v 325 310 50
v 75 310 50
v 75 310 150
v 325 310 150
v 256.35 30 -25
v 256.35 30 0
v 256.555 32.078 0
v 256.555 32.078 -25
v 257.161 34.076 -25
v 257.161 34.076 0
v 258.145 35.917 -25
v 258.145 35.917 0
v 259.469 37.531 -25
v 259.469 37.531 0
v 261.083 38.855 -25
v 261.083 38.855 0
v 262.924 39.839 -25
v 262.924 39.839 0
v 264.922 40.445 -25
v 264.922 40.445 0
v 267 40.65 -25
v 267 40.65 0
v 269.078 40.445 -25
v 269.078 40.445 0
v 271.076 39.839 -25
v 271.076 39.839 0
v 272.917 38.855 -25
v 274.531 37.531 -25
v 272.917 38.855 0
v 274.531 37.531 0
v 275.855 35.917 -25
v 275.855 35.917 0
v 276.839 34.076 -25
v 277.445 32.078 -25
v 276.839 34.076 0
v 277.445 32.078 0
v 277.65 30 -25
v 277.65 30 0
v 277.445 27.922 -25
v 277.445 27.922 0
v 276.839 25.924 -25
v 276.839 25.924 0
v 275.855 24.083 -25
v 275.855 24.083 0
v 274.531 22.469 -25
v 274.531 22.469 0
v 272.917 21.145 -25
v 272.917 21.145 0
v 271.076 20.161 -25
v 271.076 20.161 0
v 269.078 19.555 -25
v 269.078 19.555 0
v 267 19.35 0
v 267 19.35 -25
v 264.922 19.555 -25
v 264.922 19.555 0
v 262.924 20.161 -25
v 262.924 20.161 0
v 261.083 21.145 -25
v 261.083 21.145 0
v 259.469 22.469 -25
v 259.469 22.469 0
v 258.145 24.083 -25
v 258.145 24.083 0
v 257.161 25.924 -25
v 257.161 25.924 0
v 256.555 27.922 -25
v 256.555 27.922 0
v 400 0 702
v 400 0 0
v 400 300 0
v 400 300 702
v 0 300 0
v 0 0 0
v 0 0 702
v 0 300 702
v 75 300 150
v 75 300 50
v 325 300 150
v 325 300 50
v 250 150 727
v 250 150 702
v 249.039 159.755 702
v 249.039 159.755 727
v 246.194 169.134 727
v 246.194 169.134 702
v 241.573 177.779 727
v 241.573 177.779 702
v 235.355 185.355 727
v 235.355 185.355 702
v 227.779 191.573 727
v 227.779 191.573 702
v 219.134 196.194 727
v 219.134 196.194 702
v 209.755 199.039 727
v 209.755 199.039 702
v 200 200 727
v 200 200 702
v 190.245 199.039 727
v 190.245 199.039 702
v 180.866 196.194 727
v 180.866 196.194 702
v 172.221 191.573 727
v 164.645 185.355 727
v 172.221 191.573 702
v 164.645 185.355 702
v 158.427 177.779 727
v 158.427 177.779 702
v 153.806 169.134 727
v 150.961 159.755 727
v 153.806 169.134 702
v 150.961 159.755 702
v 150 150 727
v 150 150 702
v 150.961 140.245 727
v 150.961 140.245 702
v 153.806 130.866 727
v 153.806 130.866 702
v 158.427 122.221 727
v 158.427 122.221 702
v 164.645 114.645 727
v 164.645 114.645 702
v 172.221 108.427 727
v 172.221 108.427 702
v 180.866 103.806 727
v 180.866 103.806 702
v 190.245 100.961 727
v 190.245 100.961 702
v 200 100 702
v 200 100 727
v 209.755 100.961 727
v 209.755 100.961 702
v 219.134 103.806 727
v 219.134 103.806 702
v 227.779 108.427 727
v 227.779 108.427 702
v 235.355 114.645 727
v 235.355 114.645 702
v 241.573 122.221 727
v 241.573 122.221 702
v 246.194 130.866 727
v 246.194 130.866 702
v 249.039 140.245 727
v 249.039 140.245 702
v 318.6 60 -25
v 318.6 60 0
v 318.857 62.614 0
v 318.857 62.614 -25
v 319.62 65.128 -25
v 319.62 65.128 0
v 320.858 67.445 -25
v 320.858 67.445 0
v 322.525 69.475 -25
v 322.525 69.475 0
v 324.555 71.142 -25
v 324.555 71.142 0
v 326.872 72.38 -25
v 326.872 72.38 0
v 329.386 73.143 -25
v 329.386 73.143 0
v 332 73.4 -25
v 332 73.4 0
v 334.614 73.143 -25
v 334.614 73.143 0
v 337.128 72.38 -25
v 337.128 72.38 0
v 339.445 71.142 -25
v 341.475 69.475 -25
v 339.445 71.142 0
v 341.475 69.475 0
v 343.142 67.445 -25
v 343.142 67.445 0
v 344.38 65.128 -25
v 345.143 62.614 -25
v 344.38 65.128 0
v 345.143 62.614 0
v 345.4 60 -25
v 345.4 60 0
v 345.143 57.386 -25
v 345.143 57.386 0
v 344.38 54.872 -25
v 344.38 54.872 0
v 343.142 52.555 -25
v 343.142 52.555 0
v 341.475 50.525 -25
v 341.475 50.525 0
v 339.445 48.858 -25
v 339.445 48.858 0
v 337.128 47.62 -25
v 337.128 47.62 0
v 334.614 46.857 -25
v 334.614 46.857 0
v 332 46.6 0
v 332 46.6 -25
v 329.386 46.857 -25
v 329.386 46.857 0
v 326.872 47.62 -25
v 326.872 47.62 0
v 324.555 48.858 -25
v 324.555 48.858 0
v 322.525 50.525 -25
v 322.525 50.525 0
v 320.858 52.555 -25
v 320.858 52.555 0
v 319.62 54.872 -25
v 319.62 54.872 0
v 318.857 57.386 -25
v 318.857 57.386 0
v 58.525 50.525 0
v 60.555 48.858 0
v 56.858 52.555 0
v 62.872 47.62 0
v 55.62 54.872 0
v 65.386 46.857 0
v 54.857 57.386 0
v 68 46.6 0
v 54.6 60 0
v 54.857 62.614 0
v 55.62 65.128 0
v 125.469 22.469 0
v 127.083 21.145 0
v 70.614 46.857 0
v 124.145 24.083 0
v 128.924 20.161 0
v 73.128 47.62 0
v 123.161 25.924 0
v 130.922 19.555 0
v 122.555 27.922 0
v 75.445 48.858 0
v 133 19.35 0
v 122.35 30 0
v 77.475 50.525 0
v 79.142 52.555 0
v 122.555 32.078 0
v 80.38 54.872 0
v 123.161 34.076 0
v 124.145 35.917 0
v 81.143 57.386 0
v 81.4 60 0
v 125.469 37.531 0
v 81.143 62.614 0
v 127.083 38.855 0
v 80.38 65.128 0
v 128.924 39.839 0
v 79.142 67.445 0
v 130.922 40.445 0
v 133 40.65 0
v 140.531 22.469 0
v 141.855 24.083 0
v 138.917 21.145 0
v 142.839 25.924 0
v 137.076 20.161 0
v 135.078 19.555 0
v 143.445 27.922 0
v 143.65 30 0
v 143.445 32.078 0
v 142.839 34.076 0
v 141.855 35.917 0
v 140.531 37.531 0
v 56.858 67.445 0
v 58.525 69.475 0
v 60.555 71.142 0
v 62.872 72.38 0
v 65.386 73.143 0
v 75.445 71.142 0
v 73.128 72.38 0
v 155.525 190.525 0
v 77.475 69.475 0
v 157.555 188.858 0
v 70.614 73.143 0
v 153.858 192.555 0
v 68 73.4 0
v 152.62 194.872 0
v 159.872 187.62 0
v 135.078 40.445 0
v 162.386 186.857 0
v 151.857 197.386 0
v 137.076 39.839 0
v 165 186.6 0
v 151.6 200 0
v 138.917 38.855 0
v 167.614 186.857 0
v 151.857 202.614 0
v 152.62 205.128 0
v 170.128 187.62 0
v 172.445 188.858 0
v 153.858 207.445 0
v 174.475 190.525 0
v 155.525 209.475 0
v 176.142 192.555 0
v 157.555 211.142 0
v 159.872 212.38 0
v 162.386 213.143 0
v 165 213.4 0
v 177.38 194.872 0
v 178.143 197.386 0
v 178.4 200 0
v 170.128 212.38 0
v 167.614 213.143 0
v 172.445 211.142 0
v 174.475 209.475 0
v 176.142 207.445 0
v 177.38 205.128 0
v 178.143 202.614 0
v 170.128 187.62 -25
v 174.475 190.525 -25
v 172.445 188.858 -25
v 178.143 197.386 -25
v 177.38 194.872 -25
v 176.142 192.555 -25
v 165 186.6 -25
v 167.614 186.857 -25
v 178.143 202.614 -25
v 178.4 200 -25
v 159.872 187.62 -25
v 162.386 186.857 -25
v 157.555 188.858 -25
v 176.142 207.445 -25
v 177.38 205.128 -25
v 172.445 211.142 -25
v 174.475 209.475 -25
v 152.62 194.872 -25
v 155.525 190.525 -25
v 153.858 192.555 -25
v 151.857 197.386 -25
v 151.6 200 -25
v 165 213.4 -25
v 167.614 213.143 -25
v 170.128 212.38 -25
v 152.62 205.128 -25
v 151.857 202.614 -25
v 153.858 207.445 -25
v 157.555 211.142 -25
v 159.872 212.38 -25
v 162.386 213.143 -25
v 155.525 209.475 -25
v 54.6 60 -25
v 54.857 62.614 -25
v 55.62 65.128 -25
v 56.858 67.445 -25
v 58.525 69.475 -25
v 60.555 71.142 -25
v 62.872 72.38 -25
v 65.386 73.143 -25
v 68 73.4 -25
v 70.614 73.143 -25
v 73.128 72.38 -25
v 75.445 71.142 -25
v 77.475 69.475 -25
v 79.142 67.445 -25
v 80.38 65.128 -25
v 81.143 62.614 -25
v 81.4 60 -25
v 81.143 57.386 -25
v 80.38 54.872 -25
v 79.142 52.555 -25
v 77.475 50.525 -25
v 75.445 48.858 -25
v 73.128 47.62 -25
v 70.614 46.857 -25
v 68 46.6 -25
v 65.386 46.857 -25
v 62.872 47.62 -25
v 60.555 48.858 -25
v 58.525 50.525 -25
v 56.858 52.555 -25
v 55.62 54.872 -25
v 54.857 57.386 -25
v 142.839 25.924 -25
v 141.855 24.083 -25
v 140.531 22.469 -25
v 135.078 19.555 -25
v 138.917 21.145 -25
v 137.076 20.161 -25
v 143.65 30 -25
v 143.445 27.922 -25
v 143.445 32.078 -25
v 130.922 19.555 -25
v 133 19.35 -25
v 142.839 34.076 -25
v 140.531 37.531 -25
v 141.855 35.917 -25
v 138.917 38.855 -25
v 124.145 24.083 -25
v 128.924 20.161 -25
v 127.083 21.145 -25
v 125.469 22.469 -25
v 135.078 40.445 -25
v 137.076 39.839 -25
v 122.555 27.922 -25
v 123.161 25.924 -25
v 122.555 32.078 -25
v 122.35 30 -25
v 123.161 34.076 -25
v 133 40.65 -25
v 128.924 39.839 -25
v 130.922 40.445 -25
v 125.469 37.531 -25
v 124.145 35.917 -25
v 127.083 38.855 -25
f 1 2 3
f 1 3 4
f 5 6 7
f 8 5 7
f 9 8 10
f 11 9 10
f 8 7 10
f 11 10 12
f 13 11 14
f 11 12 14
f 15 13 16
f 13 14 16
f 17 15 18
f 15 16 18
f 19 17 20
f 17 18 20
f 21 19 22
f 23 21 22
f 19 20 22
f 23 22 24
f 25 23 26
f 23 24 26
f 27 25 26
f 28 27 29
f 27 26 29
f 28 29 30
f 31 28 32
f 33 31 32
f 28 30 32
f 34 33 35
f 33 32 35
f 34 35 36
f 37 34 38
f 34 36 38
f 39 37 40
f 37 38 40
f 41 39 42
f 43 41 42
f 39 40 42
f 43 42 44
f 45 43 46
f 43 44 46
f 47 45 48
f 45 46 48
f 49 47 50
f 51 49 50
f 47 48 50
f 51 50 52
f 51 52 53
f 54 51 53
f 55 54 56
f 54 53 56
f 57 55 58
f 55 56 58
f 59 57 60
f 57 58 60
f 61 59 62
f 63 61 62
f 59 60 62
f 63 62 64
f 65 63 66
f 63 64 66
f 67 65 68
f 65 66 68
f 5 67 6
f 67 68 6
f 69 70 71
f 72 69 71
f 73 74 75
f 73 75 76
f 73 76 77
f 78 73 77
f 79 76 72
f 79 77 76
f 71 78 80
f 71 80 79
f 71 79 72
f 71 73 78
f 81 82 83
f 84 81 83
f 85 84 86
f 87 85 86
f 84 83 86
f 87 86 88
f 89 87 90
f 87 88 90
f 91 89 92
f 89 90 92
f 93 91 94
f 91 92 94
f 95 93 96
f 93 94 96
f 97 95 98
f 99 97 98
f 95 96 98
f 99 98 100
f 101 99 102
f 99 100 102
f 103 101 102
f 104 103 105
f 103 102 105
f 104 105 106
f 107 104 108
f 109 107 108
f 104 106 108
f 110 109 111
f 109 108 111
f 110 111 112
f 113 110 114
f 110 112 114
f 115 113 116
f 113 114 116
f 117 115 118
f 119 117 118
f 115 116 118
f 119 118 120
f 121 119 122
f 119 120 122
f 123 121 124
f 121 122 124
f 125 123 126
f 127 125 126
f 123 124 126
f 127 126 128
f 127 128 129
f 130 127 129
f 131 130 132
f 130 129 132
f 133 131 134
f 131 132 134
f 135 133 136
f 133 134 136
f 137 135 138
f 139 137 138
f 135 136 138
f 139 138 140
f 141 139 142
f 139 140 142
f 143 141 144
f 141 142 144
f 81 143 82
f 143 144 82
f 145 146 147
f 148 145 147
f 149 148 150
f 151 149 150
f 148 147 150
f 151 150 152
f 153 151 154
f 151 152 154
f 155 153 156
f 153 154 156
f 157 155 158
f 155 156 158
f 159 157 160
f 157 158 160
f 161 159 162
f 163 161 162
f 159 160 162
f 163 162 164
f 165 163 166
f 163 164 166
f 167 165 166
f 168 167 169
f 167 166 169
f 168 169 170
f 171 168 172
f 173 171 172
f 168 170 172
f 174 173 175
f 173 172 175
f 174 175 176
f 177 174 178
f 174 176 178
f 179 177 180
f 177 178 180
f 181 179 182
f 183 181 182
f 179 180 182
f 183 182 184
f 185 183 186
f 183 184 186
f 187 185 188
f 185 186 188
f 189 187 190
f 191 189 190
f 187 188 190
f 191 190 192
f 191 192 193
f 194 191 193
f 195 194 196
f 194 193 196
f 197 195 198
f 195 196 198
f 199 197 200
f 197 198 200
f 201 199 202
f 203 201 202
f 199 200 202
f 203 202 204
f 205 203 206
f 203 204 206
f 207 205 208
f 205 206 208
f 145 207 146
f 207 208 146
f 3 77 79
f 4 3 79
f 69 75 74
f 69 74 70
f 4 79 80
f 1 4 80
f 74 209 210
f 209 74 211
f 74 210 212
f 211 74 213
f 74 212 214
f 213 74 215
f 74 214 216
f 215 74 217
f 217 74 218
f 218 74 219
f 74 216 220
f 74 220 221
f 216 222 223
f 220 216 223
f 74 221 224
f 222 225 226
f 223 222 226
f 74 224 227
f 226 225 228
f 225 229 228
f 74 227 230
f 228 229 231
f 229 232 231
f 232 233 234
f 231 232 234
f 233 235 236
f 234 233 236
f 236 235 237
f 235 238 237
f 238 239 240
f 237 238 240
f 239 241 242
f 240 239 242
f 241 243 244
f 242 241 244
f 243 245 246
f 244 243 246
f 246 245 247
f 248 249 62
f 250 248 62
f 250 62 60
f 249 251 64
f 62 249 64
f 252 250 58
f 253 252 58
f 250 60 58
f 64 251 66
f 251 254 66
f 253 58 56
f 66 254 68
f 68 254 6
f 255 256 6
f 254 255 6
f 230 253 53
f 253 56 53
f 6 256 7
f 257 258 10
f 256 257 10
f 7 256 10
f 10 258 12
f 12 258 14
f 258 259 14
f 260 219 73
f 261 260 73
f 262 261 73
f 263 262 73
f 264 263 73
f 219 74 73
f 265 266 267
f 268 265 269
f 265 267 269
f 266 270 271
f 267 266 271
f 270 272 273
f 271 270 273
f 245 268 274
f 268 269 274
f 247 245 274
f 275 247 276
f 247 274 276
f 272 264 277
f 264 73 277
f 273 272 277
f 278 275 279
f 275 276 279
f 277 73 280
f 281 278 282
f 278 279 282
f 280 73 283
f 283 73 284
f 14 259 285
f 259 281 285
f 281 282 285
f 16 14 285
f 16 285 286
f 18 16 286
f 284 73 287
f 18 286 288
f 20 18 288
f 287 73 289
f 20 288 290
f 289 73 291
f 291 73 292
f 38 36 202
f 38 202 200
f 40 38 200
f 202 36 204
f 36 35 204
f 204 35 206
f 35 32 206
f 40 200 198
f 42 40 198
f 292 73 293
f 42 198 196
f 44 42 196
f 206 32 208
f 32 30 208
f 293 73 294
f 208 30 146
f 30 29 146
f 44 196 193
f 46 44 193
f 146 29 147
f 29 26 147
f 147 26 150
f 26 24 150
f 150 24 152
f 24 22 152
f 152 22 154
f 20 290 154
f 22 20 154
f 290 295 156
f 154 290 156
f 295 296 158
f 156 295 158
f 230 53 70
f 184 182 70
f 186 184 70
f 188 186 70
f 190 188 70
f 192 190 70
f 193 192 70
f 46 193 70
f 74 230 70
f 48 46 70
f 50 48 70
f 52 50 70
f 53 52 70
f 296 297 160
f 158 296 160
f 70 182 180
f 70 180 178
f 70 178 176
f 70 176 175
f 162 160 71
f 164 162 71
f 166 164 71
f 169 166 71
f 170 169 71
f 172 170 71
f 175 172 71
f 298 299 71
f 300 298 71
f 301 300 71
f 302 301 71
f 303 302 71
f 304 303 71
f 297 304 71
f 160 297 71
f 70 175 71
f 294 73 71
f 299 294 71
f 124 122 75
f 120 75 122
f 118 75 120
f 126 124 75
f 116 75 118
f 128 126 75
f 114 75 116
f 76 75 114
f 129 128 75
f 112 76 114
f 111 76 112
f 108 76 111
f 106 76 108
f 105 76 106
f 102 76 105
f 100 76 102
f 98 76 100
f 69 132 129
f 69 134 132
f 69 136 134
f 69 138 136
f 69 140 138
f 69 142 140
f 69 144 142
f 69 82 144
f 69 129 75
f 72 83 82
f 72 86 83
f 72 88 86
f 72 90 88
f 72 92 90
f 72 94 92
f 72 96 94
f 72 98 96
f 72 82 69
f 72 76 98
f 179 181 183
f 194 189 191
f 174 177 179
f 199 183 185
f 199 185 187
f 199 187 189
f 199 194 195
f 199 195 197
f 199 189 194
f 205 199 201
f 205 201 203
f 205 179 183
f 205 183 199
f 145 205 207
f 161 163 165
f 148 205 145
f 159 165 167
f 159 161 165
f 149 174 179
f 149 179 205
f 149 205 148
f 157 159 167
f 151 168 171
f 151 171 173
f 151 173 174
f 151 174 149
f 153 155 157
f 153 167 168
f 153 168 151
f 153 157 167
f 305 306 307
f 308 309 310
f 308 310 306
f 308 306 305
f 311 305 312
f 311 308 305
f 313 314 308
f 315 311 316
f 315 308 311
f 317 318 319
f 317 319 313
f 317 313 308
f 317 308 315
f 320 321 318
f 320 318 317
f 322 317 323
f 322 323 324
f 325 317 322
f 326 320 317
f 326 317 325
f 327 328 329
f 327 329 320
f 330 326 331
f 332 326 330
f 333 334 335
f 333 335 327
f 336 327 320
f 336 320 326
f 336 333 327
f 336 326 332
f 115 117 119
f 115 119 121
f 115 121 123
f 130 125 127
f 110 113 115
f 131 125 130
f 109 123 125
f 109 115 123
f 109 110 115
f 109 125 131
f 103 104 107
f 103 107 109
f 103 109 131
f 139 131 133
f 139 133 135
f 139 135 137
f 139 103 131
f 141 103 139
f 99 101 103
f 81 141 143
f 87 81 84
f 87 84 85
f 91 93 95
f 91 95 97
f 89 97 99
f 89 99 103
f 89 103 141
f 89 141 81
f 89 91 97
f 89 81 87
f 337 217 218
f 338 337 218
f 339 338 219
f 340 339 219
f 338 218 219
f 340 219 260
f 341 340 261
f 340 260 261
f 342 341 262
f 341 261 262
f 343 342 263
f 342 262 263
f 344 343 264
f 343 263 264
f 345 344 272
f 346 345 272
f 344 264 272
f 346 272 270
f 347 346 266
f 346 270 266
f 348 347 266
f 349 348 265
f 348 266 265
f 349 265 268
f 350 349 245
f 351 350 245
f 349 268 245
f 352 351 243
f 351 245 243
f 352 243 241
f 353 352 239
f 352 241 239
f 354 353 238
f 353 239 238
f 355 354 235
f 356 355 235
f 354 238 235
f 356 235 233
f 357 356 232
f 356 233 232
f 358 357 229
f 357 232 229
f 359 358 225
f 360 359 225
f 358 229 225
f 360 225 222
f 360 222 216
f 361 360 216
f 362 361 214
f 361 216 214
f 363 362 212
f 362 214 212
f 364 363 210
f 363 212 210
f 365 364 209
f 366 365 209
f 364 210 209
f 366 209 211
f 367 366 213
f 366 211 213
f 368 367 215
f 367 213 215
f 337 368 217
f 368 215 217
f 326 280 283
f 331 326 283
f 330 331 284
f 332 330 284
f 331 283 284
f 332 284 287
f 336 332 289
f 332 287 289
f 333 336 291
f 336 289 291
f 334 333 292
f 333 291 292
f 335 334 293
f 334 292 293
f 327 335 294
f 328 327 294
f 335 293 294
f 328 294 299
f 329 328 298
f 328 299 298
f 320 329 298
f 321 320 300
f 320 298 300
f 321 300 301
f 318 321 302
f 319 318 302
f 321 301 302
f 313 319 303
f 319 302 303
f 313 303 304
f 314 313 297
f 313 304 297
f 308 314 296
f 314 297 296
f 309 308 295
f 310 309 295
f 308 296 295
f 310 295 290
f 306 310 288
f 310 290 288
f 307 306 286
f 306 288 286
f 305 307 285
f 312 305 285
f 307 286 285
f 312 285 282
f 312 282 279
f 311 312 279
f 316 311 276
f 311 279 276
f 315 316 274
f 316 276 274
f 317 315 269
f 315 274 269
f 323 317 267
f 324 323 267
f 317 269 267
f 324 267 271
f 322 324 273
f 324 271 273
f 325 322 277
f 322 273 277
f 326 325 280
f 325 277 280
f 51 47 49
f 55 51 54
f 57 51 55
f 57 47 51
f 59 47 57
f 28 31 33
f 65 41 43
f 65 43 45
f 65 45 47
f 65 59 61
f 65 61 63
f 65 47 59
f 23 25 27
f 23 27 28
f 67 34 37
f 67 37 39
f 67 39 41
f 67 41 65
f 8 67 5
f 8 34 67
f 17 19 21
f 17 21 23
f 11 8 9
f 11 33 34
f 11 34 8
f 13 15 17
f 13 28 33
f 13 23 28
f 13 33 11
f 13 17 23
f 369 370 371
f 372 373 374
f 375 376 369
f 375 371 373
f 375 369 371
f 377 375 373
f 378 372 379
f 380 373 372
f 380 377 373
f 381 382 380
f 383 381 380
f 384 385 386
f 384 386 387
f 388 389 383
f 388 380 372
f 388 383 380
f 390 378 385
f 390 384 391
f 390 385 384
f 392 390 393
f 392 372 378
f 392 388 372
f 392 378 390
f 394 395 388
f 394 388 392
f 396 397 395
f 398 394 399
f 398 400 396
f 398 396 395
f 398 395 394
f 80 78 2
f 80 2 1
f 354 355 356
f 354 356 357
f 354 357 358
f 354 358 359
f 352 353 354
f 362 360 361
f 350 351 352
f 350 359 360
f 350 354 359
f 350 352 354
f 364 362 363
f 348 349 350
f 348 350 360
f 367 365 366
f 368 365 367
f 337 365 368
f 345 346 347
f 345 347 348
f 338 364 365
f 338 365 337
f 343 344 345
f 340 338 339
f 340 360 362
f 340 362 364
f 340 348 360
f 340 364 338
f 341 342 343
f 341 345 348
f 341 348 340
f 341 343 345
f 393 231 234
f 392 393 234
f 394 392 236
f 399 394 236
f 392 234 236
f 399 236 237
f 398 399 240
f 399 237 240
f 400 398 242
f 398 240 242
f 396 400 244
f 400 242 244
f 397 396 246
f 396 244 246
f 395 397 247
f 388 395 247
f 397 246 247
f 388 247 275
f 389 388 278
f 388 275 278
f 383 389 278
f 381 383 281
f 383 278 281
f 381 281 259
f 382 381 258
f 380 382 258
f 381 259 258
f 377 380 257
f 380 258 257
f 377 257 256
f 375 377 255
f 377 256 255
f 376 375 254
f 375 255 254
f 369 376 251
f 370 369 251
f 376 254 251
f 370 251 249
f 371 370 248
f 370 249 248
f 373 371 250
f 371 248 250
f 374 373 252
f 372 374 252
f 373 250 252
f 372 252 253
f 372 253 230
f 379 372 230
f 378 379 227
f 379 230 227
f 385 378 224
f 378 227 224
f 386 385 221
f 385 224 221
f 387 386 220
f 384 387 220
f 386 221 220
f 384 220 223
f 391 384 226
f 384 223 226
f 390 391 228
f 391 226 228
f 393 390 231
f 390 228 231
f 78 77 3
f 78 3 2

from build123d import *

# Parameters (mm, degrees)
SKETCH_1_W      = 400
SKETCH_1_H      = 300
EXTRUDE_1_DEPTH = 702
SKETCH_2_R      = 13.4
SKETCH_2_R_2    = 10.65
EXTRUDE_2_DEPTH = 25
SKETCH_3_R      = 50
EXTRUDE_3_DEPTH = 25
SKETCH_4_W      = 250
SKETCH_4_H      = 100
EXTRUDE_4_DEPTH = 10


with BuildPart() as part:
    # Эскиз1 → Бобышка-Вытянуть1 (new body)
    with BuildSketch(Plane.XY):
        with Locations((200, 150)):
            Rectangle(SKETCH_1_W, SKETCH_1_H)
    extrude(amount=EXTRUDE_1_DEPTH)

    # Эскиз2 → Бобышка-Вытянуть2 (add)
    with BuildSketch(Plane(origin=(0, 0, 0), x_dir=(-1, 0, 0), z_dir=(0, 0, -1))):
        with Locations((-332, 60)):
            Circle(SKETCH_2_R)
        with Locations((-267, 30)):
            Circle(SKETCH_2_R_2)
        with Locations((-165, 200)):
            Circle(SKETCH_2_R)
        with Locations((-133, 30)):
            Circle(SKETCH_2_R_2)
        with Locations((-68, 60)):
            Circle(SKETCH_2_R)
    extrude(amount=EXTRUDE_2_DEPTH)

    # Эскиз3 → Бобышка-Вытянуть3 (add)
    with BuildSketch(Plane.XY.offset(702)):
        with Locations((200, 150)):
            Circle(SKETCH_3_R)
    extrude(amount=EXTRUDE_3_DEPTH)

    # Эскиз4 → Бобышка-Вытянуть4 (add)
    with BuildSketch(Plane(origin=(0, 300, 0), x_dir=(1, 0, 0), z_dir=(0, 1, 0))):
        with Locations((200, -100)):
            Rectangle(SKETCH_4_W, SKETCH_4_H)
    extrude(amount=EXTRUDE_4_DEPTH)


solid = part.part
